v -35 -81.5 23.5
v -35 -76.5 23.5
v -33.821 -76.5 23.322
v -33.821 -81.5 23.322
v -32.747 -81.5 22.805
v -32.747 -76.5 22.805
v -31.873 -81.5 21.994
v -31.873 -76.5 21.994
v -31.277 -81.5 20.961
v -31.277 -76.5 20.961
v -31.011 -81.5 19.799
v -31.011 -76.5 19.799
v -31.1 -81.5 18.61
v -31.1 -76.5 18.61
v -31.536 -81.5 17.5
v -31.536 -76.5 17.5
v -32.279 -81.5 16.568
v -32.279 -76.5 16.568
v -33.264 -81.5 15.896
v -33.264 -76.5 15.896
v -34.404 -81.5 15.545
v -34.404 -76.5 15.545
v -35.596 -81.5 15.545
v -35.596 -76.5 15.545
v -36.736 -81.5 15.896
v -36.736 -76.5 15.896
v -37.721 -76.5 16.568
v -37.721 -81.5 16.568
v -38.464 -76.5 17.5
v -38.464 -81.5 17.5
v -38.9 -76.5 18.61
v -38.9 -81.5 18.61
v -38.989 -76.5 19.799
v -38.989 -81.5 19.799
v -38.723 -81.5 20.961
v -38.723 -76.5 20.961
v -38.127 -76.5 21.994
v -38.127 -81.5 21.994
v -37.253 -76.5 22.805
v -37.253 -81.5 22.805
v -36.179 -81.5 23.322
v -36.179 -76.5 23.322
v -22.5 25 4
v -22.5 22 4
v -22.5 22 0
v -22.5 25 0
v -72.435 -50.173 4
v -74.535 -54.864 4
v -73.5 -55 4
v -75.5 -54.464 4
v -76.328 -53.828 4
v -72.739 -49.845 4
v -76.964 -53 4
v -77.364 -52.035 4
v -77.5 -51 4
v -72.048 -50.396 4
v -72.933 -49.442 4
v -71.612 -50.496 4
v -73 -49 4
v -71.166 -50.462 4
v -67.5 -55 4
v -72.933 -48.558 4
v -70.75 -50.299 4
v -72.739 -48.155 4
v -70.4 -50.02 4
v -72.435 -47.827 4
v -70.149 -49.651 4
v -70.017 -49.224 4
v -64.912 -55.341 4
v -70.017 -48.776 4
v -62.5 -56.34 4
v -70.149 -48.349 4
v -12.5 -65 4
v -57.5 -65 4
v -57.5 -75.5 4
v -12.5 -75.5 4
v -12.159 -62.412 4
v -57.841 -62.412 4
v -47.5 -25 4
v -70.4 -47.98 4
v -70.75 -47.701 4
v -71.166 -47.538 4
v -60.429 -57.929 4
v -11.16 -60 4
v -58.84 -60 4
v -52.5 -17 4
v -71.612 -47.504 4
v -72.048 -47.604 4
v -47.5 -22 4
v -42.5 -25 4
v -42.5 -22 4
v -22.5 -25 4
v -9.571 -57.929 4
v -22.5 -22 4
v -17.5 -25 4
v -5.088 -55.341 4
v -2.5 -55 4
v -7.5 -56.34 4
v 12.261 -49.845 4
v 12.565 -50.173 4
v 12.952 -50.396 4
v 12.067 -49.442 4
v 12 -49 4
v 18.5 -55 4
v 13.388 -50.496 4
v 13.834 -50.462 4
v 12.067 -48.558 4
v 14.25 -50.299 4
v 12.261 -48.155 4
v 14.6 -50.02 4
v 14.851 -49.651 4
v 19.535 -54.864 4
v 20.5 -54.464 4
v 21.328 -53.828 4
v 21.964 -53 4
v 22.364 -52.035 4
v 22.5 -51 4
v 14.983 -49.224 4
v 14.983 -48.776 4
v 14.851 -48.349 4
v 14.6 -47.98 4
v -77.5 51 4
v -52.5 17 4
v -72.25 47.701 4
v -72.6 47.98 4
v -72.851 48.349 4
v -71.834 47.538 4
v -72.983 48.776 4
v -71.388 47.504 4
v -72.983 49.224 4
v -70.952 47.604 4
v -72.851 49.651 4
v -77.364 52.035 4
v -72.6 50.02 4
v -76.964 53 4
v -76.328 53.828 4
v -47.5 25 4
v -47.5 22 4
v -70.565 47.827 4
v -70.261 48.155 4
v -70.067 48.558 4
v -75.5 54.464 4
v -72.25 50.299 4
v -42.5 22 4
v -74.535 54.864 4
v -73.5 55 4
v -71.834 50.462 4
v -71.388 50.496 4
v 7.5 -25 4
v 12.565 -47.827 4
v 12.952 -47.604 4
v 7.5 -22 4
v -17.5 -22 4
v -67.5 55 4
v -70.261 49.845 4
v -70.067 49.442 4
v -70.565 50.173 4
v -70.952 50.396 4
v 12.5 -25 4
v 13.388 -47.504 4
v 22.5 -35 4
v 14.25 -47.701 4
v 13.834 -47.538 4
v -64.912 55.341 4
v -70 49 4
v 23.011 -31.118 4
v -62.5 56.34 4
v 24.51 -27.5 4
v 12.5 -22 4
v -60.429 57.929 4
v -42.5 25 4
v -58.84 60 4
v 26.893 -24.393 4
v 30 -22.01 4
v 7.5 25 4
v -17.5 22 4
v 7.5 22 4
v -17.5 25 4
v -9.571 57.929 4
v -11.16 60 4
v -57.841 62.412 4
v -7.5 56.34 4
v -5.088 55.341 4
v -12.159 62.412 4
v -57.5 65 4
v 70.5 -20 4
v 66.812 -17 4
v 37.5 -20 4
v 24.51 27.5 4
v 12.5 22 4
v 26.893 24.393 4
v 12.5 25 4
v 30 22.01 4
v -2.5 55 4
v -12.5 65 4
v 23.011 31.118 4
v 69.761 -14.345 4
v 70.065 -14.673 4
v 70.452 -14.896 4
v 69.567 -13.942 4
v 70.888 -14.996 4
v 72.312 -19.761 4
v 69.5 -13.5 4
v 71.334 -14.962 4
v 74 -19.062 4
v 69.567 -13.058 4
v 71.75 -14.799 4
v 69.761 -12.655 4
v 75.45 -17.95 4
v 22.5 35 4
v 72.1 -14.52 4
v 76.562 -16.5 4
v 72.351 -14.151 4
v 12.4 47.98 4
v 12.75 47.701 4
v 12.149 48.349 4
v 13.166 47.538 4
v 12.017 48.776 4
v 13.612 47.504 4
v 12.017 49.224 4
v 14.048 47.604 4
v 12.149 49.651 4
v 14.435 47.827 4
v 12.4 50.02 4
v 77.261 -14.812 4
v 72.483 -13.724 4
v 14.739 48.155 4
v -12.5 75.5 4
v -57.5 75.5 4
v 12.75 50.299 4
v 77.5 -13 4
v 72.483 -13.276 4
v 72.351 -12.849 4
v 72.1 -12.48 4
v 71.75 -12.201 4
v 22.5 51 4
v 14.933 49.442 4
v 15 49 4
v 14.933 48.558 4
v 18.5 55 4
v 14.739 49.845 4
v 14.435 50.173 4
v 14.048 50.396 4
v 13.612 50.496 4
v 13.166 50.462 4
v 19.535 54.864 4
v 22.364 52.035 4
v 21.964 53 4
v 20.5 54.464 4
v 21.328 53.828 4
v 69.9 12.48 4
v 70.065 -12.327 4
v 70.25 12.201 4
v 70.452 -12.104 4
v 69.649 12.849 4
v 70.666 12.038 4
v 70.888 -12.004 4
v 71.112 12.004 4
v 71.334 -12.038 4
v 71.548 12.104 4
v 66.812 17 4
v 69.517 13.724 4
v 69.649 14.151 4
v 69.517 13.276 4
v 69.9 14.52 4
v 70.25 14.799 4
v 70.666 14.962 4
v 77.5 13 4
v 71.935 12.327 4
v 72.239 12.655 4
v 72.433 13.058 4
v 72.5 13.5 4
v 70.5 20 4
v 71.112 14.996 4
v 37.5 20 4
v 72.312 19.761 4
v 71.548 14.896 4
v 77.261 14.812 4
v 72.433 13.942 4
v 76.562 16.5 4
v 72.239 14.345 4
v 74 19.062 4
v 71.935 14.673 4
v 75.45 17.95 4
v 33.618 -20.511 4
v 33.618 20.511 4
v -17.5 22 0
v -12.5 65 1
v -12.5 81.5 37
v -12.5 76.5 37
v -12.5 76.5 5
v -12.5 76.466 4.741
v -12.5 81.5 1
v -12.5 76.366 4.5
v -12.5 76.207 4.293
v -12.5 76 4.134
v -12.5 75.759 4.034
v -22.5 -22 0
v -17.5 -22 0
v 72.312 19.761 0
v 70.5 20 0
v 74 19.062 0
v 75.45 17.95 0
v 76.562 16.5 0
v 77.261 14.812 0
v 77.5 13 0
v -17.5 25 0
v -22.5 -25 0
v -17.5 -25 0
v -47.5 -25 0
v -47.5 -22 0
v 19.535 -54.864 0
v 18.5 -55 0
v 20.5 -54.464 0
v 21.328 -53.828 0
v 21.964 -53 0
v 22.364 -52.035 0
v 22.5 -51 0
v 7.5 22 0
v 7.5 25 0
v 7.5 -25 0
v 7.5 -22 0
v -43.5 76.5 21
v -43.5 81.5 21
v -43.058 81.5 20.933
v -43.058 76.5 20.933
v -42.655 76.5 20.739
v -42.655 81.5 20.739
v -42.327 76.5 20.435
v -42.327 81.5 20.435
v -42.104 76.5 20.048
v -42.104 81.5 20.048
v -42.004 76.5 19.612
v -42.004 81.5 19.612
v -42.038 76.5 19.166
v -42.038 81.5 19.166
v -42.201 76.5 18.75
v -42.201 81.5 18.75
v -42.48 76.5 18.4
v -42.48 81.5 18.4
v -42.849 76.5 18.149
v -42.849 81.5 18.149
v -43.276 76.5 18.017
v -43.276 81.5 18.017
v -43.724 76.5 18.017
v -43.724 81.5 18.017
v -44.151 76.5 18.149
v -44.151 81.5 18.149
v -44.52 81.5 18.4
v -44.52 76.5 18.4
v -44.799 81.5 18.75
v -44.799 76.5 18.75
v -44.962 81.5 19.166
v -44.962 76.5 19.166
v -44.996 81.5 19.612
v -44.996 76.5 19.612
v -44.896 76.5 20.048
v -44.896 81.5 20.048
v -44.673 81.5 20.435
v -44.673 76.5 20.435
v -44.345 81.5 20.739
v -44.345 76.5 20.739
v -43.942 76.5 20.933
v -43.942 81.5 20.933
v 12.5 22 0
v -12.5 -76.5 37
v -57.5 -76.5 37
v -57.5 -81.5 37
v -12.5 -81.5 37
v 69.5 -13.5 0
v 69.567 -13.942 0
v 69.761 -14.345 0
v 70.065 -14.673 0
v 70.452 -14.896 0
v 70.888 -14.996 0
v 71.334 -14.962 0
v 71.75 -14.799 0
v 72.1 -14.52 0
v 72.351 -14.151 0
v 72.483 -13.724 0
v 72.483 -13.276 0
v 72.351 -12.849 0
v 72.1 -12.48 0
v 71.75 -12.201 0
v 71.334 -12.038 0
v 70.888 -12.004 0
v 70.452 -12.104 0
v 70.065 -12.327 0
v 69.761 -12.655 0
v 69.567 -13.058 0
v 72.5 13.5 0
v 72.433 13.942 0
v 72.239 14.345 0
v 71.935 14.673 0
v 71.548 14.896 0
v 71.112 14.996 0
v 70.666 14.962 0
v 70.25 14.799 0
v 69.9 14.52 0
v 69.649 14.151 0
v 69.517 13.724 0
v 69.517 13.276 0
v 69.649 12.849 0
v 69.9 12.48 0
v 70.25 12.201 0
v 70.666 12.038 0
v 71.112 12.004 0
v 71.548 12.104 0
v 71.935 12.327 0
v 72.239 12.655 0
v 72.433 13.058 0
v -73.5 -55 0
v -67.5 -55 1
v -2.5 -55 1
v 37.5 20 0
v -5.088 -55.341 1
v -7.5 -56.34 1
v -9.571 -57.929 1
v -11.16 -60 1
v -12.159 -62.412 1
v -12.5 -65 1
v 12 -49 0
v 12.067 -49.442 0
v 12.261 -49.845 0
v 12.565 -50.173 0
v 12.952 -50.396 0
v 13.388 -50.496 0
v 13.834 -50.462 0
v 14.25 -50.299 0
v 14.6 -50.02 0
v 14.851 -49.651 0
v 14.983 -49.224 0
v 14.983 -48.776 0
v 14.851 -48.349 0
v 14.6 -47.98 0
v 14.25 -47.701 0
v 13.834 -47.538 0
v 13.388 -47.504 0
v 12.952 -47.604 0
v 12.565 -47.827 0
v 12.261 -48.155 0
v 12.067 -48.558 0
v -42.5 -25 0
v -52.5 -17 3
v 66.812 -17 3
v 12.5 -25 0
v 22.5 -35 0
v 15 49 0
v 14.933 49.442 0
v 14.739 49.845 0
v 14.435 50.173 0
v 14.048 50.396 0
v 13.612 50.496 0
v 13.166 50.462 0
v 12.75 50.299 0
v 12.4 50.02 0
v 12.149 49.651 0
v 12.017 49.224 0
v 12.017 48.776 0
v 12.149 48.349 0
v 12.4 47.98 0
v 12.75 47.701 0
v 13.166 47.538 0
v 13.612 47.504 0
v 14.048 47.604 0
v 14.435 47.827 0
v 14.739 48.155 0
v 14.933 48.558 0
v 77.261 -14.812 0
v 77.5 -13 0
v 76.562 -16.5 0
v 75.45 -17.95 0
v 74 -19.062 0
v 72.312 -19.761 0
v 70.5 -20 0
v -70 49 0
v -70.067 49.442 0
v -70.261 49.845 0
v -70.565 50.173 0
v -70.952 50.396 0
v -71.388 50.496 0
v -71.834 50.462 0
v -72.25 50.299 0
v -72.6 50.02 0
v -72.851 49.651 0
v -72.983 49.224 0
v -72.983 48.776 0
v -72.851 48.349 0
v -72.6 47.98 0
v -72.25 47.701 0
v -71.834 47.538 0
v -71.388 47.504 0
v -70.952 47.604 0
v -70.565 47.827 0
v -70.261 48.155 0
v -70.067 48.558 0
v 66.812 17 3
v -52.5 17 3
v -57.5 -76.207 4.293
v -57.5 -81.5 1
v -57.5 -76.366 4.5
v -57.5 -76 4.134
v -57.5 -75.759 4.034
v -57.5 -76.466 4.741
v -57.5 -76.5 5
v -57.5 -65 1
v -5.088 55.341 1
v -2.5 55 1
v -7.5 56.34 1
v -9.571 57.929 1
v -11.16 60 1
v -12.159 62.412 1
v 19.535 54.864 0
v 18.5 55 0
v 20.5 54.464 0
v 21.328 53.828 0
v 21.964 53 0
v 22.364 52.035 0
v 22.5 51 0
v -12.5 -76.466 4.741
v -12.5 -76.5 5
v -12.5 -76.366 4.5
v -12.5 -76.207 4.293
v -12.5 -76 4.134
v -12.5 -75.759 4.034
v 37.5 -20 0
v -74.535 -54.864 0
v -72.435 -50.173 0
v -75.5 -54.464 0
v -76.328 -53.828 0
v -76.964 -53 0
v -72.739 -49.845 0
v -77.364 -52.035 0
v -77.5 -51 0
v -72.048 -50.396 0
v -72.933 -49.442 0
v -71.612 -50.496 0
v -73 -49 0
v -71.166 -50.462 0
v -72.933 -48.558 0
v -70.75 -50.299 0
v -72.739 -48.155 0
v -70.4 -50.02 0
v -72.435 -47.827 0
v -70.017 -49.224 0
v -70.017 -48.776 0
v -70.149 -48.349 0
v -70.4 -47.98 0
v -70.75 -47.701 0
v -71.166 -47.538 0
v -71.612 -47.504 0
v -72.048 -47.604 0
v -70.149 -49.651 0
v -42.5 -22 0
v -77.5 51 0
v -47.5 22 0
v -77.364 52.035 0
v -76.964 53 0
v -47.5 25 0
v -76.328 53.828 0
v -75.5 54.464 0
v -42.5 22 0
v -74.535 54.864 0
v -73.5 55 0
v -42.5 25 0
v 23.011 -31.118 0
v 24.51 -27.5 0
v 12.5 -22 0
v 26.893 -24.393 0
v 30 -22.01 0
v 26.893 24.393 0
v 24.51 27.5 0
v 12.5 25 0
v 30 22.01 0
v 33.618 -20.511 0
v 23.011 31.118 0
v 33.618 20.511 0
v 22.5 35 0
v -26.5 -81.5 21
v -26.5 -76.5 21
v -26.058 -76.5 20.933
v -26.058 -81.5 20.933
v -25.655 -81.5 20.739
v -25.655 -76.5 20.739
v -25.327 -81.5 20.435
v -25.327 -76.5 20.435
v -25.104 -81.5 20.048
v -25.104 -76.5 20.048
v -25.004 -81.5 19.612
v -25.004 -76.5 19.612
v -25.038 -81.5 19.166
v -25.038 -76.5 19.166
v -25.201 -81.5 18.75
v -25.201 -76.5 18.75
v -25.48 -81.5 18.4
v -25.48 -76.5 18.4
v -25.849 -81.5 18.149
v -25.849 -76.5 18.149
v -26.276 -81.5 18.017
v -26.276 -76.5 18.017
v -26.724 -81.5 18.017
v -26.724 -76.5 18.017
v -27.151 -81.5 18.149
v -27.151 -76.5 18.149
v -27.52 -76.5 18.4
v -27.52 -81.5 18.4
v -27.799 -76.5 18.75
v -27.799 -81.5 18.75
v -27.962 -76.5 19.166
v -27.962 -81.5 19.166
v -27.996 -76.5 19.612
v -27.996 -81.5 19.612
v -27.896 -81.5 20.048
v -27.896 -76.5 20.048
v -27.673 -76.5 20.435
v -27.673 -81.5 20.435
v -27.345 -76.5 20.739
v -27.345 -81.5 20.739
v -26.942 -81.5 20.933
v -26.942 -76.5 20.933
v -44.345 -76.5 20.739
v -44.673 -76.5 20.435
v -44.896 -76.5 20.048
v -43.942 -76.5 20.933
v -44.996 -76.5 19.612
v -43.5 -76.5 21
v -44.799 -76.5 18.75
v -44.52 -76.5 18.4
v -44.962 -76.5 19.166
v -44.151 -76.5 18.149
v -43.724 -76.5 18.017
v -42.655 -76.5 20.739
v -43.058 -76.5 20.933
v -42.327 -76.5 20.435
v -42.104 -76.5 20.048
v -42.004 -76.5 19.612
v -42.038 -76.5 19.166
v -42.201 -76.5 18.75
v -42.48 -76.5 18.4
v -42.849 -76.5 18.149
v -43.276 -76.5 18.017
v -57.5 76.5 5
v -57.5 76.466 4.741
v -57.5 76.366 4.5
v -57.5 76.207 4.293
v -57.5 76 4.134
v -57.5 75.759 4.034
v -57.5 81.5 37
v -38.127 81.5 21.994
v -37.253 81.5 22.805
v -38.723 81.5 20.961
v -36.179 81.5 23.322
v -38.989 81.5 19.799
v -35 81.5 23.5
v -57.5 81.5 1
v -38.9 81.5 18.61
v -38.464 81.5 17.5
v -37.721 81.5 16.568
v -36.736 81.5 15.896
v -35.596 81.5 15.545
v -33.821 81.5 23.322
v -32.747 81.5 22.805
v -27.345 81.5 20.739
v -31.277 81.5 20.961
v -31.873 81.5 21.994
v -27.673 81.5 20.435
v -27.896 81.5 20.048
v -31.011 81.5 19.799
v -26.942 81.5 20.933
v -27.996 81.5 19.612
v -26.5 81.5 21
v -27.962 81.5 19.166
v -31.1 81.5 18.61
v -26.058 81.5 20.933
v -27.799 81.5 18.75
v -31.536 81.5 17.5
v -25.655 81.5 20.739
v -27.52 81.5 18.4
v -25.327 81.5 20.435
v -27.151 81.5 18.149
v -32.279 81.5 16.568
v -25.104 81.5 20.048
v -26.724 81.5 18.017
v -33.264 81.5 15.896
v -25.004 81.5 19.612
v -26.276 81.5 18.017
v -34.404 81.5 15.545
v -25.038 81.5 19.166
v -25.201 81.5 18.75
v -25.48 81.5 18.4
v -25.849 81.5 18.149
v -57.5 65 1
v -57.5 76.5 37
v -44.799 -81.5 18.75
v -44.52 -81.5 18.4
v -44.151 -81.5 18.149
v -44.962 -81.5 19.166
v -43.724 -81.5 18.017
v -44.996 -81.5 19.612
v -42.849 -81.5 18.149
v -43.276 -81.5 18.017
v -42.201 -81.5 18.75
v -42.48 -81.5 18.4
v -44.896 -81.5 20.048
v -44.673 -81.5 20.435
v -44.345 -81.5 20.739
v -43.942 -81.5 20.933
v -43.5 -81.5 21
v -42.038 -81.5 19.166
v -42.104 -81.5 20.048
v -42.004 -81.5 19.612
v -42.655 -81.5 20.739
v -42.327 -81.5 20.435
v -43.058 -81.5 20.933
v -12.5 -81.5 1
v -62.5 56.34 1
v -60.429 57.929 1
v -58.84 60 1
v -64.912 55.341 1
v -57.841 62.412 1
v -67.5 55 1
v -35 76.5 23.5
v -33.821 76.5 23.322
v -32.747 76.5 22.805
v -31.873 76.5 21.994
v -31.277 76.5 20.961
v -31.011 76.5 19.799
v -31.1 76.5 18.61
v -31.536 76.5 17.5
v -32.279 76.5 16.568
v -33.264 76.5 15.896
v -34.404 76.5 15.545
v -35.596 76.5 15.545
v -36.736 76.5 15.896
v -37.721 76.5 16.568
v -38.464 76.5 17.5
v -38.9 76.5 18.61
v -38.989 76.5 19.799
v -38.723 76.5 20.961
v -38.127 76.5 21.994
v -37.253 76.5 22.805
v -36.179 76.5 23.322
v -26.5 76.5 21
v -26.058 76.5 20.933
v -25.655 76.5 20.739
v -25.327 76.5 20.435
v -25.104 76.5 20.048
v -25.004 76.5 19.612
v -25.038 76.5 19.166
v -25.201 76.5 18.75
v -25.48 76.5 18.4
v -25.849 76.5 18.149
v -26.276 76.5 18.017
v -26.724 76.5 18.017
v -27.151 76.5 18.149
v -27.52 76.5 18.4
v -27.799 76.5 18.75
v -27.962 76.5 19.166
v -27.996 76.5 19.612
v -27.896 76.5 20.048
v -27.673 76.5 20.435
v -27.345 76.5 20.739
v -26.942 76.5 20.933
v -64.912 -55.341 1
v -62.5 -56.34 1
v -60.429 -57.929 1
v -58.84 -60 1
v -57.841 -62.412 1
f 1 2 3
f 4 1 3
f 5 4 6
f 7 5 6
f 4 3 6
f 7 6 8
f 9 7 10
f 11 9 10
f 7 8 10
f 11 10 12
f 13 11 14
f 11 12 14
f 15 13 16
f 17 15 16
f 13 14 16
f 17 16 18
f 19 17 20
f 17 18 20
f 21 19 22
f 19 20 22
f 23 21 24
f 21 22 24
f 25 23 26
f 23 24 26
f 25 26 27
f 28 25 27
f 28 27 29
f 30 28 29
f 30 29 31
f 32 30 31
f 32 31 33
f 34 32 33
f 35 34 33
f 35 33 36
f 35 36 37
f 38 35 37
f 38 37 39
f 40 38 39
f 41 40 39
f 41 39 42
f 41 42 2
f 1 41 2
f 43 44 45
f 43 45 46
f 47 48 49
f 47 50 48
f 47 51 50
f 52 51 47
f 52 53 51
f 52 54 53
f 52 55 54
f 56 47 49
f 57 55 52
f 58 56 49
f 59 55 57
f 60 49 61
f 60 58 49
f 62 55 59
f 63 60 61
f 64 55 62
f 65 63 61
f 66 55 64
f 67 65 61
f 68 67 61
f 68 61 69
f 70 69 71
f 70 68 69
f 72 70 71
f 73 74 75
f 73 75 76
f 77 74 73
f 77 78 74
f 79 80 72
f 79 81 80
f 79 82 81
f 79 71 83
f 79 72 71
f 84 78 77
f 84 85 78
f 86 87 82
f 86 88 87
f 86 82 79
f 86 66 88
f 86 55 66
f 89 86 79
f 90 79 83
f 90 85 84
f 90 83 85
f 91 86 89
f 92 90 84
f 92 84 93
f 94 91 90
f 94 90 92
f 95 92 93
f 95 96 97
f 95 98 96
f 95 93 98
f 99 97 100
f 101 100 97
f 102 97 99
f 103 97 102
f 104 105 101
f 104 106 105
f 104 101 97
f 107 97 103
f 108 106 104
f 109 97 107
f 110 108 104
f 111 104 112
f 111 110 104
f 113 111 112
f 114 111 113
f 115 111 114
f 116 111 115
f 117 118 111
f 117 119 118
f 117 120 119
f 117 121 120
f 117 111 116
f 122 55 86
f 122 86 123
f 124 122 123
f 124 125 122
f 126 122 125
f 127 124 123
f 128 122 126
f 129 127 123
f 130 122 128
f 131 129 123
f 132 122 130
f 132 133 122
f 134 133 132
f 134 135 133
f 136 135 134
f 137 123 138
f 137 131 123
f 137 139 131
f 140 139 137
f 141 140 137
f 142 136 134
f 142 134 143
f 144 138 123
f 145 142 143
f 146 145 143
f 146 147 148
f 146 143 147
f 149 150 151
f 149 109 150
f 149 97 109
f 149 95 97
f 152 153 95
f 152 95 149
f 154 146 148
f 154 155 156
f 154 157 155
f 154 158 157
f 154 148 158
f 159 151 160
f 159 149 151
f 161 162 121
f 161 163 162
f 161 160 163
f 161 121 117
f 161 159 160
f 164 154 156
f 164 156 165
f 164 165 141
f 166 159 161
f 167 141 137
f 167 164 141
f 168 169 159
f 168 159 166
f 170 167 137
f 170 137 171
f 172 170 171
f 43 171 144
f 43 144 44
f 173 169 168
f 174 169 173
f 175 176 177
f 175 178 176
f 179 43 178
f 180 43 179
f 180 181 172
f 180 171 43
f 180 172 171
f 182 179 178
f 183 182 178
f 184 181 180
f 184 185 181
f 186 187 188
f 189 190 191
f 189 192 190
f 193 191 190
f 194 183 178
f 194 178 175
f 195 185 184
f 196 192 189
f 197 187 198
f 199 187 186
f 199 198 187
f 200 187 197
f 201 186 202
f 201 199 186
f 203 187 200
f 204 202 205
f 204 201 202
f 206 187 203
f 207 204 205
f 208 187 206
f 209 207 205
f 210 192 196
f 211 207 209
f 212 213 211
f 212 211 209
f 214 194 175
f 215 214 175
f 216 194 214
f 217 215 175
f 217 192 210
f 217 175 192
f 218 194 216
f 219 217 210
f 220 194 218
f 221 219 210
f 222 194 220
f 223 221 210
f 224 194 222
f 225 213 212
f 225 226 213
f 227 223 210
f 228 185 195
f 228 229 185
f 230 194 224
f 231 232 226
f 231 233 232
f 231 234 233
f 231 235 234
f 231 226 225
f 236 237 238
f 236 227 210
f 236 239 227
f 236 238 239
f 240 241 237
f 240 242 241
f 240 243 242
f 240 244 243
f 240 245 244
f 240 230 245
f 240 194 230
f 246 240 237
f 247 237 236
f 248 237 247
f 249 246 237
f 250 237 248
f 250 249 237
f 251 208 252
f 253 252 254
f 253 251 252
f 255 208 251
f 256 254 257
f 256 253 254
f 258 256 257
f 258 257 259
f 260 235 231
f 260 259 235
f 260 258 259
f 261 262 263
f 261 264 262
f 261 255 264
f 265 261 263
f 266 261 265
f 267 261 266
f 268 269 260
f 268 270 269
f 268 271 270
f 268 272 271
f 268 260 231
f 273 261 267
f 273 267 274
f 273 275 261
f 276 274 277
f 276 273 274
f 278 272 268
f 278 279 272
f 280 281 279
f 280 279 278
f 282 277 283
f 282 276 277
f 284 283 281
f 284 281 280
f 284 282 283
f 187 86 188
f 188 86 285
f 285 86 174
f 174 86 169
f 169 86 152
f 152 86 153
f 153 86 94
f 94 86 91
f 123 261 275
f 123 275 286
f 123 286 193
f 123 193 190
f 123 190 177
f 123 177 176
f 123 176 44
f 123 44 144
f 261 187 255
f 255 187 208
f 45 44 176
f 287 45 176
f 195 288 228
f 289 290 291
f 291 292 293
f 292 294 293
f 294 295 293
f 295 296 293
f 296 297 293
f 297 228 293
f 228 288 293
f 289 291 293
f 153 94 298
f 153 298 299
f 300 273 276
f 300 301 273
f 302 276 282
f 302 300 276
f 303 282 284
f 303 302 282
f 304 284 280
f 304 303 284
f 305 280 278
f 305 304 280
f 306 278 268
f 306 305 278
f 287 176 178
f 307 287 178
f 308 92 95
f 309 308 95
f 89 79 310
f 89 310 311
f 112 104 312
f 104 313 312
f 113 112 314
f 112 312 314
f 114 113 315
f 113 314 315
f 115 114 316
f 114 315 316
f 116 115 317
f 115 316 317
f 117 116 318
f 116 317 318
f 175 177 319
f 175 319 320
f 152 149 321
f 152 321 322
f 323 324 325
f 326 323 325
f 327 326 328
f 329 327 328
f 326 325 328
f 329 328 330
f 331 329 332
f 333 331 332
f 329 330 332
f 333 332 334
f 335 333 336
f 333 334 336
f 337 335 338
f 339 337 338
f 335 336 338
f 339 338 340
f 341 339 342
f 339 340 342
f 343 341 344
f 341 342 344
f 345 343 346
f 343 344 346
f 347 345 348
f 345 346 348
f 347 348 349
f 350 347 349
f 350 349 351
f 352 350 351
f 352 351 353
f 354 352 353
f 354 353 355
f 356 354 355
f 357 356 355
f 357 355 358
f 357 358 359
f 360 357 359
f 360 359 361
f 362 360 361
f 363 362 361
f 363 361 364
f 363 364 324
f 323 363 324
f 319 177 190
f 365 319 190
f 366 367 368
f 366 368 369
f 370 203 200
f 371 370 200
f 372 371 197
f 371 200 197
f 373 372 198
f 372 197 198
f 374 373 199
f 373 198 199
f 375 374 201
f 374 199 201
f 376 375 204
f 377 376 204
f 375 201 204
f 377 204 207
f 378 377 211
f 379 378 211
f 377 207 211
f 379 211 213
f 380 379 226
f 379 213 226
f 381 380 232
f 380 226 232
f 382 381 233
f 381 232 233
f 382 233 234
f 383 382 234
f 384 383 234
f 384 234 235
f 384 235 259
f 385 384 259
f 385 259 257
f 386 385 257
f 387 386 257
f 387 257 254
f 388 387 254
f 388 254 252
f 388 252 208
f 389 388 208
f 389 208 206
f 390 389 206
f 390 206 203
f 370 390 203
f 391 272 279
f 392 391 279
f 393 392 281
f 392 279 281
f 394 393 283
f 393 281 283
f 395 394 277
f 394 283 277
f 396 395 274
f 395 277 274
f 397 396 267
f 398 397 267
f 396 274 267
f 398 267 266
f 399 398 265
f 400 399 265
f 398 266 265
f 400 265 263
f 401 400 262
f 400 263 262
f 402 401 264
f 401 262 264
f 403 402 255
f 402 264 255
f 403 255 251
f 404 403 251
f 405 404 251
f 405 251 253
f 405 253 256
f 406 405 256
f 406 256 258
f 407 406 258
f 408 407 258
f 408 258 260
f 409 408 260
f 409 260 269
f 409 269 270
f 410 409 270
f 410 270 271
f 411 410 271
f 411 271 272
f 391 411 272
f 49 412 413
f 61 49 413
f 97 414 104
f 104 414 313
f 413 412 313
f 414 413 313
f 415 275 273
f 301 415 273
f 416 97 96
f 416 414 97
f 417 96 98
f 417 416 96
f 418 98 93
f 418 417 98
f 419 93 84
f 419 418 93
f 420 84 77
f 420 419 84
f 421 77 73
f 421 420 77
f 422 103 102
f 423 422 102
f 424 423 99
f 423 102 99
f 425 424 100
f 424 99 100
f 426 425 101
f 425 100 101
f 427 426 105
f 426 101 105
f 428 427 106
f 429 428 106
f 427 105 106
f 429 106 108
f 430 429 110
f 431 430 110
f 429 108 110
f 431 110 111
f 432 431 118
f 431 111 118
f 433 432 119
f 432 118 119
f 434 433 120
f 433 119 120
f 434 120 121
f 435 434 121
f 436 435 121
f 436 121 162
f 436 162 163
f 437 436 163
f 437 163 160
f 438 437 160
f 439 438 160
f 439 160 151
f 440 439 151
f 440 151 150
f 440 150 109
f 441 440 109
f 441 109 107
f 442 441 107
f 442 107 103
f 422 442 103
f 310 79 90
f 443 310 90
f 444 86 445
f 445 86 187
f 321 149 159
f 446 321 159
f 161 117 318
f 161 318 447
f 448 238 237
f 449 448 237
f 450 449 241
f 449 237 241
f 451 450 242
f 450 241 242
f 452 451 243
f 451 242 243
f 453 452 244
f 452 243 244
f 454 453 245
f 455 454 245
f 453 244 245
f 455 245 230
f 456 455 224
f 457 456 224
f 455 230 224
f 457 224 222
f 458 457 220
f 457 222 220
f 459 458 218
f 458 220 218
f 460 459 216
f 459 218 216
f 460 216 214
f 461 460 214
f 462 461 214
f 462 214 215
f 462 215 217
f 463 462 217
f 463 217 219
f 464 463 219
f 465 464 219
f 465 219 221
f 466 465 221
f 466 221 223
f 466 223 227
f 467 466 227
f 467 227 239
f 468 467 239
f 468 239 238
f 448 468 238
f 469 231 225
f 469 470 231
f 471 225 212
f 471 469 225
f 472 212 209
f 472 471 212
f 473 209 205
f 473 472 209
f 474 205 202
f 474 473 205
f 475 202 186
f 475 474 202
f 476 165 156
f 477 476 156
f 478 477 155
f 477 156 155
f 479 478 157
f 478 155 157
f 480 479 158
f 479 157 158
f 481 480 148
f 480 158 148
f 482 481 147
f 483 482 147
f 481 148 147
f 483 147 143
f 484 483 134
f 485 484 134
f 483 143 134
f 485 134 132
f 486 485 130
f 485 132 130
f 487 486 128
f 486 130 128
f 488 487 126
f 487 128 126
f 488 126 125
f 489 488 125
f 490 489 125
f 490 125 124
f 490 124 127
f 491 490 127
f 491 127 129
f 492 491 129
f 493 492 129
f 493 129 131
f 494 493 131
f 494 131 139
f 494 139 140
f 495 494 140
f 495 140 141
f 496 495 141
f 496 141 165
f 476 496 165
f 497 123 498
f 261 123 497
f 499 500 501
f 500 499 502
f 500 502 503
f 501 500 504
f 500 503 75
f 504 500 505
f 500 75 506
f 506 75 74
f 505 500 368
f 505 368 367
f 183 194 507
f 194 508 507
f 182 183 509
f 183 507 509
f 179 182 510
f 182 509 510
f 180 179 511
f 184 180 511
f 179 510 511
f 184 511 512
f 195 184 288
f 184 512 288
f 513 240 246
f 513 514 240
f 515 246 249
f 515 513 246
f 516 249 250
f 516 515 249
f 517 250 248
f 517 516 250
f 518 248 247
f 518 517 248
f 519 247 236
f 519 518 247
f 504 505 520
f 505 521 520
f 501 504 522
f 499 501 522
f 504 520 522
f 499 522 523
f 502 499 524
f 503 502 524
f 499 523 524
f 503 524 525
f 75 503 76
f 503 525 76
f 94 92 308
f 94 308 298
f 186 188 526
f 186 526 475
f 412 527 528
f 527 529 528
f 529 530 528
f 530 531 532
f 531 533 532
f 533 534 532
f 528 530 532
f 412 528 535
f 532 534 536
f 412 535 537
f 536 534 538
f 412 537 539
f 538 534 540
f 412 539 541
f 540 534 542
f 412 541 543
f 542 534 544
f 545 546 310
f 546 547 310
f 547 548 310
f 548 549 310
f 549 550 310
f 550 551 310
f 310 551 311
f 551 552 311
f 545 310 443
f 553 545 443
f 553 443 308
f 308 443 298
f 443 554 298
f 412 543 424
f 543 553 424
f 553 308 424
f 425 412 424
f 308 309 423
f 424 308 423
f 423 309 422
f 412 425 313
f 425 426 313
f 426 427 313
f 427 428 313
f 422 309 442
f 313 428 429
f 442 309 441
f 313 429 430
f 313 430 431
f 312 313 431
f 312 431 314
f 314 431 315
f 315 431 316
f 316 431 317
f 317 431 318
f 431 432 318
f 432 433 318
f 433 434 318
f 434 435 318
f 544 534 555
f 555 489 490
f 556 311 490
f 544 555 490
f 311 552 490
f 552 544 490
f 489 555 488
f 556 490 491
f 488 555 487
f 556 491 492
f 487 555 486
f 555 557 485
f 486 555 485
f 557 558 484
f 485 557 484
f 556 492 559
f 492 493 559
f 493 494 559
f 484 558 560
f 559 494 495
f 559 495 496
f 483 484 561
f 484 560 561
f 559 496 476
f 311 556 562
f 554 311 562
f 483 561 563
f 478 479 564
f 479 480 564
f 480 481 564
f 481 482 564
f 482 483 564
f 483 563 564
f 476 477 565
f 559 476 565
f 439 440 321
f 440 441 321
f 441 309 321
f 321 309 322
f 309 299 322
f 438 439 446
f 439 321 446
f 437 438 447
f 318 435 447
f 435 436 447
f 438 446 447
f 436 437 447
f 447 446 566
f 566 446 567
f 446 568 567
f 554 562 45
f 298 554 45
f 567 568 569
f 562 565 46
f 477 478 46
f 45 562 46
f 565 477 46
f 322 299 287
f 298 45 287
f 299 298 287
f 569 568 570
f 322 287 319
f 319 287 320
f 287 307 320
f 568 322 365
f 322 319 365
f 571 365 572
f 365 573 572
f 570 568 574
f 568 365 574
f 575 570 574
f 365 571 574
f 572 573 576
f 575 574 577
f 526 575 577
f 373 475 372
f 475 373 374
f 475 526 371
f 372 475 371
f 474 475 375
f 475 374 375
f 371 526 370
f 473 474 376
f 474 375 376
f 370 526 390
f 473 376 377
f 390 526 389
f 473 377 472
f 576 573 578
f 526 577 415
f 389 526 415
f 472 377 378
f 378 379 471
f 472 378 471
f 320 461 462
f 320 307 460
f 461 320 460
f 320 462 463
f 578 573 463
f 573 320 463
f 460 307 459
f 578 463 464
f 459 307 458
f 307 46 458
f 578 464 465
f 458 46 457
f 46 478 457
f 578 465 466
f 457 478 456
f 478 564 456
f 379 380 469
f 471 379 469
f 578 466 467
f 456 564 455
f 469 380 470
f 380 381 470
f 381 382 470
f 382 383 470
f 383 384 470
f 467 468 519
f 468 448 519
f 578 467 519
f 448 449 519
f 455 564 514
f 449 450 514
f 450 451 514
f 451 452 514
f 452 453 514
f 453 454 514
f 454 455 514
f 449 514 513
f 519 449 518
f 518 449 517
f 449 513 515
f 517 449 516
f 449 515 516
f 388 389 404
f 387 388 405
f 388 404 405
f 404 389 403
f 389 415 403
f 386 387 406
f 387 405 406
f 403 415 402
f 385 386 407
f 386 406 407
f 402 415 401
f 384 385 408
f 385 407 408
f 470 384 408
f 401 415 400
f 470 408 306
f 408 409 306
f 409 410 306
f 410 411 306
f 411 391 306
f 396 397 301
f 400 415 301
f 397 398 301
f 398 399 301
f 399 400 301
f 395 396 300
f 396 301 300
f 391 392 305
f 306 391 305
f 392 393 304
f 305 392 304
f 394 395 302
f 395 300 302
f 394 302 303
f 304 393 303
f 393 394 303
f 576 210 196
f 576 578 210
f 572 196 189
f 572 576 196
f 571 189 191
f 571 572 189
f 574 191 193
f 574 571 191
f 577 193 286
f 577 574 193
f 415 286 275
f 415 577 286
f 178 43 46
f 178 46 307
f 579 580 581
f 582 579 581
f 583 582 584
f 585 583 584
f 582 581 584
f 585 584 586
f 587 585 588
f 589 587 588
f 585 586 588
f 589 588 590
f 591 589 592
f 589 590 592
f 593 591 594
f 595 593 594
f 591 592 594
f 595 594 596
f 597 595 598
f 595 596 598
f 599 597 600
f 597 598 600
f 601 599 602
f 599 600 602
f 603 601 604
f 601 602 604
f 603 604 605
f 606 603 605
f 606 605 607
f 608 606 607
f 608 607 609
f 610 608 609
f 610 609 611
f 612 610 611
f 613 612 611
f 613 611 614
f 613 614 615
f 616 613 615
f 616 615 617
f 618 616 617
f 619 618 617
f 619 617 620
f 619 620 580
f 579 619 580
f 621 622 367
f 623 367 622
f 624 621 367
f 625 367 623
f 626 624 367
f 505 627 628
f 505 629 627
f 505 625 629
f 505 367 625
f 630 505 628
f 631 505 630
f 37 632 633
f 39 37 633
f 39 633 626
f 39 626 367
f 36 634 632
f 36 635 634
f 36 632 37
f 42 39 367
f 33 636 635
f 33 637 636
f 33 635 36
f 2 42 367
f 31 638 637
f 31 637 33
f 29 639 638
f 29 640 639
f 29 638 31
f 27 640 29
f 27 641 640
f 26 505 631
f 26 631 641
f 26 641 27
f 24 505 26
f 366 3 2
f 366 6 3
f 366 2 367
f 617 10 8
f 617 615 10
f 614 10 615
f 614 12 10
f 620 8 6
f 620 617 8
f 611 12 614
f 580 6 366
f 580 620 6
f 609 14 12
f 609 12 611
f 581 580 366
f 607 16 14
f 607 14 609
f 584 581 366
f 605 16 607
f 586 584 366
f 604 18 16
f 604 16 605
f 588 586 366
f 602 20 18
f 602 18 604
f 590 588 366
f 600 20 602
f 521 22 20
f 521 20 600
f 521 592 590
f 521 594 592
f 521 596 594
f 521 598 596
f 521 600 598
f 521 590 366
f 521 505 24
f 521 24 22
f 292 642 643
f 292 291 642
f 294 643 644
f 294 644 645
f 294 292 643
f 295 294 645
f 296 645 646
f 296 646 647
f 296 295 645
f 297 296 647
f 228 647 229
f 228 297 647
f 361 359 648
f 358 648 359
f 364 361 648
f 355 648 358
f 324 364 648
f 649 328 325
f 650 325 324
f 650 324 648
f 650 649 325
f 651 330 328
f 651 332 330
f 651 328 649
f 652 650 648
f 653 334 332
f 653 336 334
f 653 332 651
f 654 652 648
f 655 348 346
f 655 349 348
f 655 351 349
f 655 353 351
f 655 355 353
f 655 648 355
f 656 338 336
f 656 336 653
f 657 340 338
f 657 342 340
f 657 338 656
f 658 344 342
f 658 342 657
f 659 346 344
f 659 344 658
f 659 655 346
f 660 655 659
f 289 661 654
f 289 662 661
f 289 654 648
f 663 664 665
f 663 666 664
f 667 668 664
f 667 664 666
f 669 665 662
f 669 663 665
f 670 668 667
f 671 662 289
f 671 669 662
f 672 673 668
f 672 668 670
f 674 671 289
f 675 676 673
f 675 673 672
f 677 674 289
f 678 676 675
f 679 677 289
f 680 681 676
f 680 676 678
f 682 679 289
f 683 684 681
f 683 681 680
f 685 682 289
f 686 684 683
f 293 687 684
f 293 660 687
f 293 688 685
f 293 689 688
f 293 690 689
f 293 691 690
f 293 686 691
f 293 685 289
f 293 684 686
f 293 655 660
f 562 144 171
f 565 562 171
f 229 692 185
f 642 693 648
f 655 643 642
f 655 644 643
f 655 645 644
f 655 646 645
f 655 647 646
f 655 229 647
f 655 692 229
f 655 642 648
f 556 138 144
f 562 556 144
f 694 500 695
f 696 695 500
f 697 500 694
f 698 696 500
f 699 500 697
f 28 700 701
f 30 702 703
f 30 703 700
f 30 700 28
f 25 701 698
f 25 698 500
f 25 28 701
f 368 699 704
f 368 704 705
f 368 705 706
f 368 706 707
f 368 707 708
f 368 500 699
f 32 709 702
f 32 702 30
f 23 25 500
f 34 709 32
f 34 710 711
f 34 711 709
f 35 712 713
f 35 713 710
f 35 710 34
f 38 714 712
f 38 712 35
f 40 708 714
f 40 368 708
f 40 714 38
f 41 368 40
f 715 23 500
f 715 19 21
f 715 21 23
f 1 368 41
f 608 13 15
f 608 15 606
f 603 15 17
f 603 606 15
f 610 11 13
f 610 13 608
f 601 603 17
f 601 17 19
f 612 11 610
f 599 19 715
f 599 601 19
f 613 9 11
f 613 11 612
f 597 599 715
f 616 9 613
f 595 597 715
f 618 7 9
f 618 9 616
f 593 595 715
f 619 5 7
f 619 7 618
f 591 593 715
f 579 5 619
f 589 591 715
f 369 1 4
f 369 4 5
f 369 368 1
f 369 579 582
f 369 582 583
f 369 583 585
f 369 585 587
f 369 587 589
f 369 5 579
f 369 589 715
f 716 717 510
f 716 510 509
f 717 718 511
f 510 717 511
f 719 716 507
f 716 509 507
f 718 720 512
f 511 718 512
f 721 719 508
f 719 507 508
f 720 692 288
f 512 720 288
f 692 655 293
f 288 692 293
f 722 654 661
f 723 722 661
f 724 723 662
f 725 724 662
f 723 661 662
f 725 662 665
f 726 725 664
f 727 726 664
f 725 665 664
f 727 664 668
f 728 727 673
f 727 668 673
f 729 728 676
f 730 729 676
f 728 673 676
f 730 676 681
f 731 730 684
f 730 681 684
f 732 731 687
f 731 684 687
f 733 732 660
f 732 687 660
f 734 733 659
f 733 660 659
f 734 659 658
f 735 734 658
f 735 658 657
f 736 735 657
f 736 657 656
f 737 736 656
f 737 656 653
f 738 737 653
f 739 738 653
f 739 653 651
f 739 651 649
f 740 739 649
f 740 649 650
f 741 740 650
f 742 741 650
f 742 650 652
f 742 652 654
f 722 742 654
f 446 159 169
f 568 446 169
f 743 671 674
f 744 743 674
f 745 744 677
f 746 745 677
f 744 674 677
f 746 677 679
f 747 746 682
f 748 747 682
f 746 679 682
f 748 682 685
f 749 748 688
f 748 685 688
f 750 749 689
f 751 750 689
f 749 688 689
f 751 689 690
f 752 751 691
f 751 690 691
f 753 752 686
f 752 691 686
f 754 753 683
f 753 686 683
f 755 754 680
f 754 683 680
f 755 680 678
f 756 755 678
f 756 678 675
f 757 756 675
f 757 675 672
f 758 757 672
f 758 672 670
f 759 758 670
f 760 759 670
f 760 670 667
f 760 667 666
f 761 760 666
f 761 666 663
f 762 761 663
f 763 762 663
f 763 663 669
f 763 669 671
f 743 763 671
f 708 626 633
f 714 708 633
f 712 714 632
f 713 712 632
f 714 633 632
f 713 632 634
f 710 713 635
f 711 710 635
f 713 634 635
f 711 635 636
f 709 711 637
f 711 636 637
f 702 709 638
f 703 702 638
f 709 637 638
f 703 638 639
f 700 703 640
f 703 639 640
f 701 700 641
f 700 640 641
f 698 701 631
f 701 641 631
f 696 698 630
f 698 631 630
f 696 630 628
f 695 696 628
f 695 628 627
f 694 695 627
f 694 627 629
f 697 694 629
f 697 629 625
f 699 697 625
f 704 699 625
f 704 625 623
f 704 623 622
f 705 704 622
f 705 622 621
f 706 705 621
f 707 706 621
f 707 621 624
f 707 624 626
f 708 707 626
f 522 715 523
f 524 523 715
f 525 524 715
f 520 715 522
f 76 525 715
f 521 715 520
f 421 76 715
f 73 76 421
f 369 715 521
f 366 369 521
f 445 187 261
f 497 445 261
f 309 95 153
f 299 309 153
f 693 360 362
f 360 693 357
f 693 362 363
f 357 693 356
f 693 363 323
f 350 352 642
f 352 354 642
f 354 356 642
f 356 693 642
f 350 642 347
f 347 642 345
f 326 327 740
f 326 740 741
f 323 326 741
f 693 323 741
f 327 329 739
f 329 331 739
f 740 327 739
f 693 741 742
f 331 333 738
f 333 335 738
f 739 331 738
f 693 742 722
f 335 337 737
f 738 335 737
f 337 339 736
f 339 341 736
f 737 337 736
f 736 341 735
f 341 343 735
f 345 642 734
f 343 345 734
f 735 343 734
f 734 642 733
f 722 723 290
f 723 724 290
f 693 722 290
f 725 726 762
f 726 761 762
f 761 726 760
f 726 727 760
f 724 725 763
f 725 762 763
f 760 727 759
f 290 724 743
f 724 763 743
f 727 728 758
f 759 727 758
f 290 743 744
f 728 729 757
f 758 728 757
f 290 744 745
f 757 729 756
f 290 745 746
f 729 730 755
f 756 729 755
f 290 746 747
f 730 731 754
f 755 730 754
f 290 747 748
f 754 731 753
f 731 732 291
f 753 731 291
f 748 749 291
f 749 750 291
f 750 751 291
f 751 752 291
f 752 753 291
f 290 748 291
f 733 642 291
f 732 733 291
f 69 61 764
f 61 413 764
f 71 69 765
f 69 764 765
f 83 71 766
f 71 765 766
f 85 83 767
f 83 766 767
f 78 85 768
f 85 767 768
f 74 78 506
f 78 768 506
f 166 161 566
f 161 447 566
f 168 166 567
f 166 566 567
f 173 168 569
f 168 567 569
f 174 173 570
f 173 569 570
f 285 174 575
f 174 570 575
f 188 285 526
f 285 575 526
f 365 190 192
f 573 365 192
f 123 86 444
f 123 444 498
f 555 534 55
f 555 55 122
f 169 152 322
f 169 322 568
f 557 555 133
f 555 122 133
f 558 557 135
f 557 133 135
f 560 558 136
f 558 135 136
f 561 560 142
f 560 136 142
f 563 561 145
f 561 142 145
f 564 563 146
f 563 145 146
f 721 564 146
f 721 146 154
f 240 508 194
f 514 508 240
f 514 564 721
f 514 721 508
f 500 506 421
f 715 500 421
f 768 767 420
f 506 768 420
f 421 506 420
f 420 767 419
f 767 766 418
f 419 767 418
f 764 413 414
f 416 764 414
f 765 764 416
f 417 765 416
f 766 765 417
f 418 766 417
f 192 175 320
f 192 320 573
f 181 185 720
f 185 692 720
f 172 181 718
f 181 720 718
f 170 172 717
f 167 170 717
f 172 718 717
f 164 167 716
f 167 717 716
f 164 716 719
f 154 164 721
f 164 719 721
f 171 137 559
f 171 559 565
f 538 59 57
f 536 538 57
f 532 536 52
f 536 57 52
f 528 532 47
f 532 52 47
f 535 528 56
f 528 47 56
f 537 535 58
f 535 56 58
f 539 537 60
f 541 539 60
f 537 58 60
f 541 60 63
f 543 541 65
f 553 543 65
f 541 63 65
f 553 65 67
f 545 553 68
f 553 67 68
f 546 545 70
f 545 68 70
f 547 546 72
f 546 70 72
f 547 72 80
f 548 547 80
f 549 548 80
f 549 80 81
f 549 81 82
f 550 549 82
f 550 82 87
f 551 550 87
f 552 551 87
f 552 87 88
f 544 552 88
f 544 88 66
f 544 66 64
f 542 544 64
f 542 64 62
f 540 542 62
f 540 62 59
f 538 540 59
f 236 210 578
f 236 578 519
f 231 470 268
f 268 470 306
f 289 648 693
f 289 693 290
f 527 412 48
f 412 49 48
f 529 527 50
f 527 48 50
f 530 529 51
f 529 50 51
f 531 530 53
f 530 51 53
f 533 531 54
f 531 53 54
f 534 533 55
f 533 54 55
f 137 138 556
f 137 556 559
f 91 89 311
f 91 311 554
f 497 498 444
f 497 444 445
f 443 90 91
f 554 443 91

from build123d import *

# Parameters (mm, degrees)
SKETCH1_W           = 155
SKETCH1_H           = 110
BOSS_EXTRUDE1_DEPTH = 4
SKETCH2_W           = 55
SKETCH2_H           = 35
SKETCH2_R           = 1.5
CUT_EXTRUDE1_DEPTH  = 148
FILLET2_R           = 15
FILLET3_R           = 7
SKETCH3_W           = 45
SKETCH3_H           = 26.5
BOSS_EXTRUDE2_DEPTH = 3
SKETCH5_W           = 45
SKETCH5_H           = 5
BOSS_EXTRUDE3_DEPTH = 33
SKETCH6_R           = 4
SKETCH6_R_2         = 1.5
CUT_EXTRUDE2_DEPTH  = 223
FILLET4_R           = 10
FILLET5_R           = 1
SKETCH9_W           = 119.31184044
SKETCH9_H           = 34
CUT_EXTRUDE4_DEPTH  = 1
FILLET8_R           = 4
SKETCH10_W          = 5
SKETCH10_H          = 3
CUT_EXTRUDE5_DEPTH  = 4


with BuildPart() as part:
    # Sketch1 → Boss-Extrude1 (new body)
    with BuildSketch(Plane.XY):
        Rectangle(SKETCH1_W, SKETCH1_H)
    extrude(amount=BOSS_EXTRUDE1_DEPTH)

    # Sketch2 → Cut-Extrude1 (cut)
    with BuildSketch(Plane.XY.offset(4)):
        with Locations((50, -37.5)):
            Rectangle(SKETCH2_W, SKETCH2_H)
        with Locations((50, 37.5)):
            Rectangle(SKETCH2_W, SKETCH2_H)
        with Locations((-71.5, 49)):
            Circle(SKETCH2_R)
        with Locations(Location((-71.5, -49, 0), (0, 0, 180))):
            Circle(SKETCH2_R)
        with Locations((71, 13.5)):
            Circle(SKETCH2_R)
        with Locations(Location((71, -13.5, 0), (0, 0, 180))):
            Circle(SKETCH2_R)
        with Locations((13.5, 49)):
            Circle(SKETCH2_R)
        with Locations(Location((13.5, -49, 0), (0, 0, 180))):
            Circle(SKETCH2_R)
    extrude(amount=-CUT_EXTRUDE1_DEPTH, mode=Mode.SUBTRACT)

    # Fillet2
    fillet2_edges = [part.edges().sort_by_distance(p)[0] for p in [
        (22.5, 20, 2),
        (22.5, -20, 2),
    ]]
    fillet(fillet2_edges, radius=FILLET2_R)

    # Fillet3
    fillet3_edges = [part.edges().sort_by_distance(p)[0] for p in [
        (77.5, 20, 2),
        (77.5, -20, 2),
    ]]
    fillet(fillet3_edges, radius=FILLET3_R)

    # Sketch3 → Boss-Extrude2 (add)
    with BuildSketch(Plane.XY.offset(4)):
        with Locations((-35, 68.25)):
            Rectangle(SKETCH3_W, SKETCH3_H)
        with Locations((-35, -68.25)):
            Rectangle(SKETCH3_W, SKETCH3_H)
    extrude(amount=-BOSS_EXTRUDE2_DEPTH)

    # Sketch5 → Boss-Extrude3 (add)
    with BuildSketch(Plane.XY.offset(4)):
        with Locations((-35, 79)):
            Rectangle(SKETCH5_W, SKETCH5_H)
        with Locations((-35, -79)):
            Rectangle(SKETCH5_W, SKETCH5_H)
    extrude(amount=BOSS_EXTRUDE3_DEPTH)

    # Sketch6 → Cut-Extrude2 (cut)
    with BuildSketch(Plane(origin=(0, 81.5, 0), x_dir=(1, 0, 0), z_dir=(0, 1, 0))):
        with Locations(Location((-35, -19.5, 0), (0, 0, 270))):
            Circle(SKETCH6_R)
        with Locations(Location((-43.5, -19.5, 0), (0, 0, 270))):
            Circle(SKETCH6_R_2)
        with Locations(Location((-26.5, -19.5, 0), (0, 0, 270))):
            Circle(SKETCH6_R_2)
    extrude(amount=-CUT_EXTRUDE2_DEPTH, mode=Mode.SUBTRACT)

    # Fillet4
    fillet4_edges = [part.edges().sort_by_distance(p)[0] for p in [
        (-12.5, 55, 2.5),
        (-57.5, 55, 2.5),
        (-57.5, -55, 2.5),
        (-12.5, -55, 2.5),
    ]]
    fillet(fillet4_edges, radius=FILLET4_R)

    # Fillet5
    fillet5_edges = [part.edges().sort_by_distance(p)[0] for p in [
        (-35, 76.5, 4),
        (-35, -76.5, 4),
    ]]
    fillet(fillet5_edges, radius=FILLET5_R)

    # Sketch9 → Cut-Extrude4 (cut)
    with BuildSketch(Plane.XY.offset(4)):
        with Locations((7.15592022, 0)):
            Rectangle(SKETCH9_W, SKETCH9_H)
    extrude(amount=-CUT_EXTRUDE4_DEPTH, mode=Mode.SUBTRACT)

    # Fillet8
    fillet8_edges = [part.edges().sort_by_distance(p)[0] for p in [
        (22.5, 55, 2),
        (22.5, -55, 2),
        (-77.5, 55, 2),
        (-77.5, -55, 2),
    ]]
    fillet(fillet8_edges, radius=FILLET8_R)

    # Sketch10 → Cut-Extrude5 (cut)
    with BuildSketch(Plane.XY.offset(4)):
        with Locations((-45, 23.5)):
            Rectangle(SKETCH10_W, SKETCH10_H)
        with Locations((-20, 23.5)):
            Rectangle(SKETCH10_W, SKETCH10_H)
        with Locations((10, 23.5)):
            Rectangle(SKETCH10_W, SKETCH10_H)
        with Locations((10, -23.5)):
            Rectangle(SKETCH10_W, SKETCH10_H)
        with Locations((-20, -23.5)):
            Rectangle(SKETCH10_W, SKETCH10_H)
        with Locations((-45, -23.5)):
            Rectangle(SKETCH10_W, SKETCH10_H)
    extrude(amount=-CUT_EXTRUDE5_DEPTH, mode=Mode.SUBTRACT)


solid = part.part
